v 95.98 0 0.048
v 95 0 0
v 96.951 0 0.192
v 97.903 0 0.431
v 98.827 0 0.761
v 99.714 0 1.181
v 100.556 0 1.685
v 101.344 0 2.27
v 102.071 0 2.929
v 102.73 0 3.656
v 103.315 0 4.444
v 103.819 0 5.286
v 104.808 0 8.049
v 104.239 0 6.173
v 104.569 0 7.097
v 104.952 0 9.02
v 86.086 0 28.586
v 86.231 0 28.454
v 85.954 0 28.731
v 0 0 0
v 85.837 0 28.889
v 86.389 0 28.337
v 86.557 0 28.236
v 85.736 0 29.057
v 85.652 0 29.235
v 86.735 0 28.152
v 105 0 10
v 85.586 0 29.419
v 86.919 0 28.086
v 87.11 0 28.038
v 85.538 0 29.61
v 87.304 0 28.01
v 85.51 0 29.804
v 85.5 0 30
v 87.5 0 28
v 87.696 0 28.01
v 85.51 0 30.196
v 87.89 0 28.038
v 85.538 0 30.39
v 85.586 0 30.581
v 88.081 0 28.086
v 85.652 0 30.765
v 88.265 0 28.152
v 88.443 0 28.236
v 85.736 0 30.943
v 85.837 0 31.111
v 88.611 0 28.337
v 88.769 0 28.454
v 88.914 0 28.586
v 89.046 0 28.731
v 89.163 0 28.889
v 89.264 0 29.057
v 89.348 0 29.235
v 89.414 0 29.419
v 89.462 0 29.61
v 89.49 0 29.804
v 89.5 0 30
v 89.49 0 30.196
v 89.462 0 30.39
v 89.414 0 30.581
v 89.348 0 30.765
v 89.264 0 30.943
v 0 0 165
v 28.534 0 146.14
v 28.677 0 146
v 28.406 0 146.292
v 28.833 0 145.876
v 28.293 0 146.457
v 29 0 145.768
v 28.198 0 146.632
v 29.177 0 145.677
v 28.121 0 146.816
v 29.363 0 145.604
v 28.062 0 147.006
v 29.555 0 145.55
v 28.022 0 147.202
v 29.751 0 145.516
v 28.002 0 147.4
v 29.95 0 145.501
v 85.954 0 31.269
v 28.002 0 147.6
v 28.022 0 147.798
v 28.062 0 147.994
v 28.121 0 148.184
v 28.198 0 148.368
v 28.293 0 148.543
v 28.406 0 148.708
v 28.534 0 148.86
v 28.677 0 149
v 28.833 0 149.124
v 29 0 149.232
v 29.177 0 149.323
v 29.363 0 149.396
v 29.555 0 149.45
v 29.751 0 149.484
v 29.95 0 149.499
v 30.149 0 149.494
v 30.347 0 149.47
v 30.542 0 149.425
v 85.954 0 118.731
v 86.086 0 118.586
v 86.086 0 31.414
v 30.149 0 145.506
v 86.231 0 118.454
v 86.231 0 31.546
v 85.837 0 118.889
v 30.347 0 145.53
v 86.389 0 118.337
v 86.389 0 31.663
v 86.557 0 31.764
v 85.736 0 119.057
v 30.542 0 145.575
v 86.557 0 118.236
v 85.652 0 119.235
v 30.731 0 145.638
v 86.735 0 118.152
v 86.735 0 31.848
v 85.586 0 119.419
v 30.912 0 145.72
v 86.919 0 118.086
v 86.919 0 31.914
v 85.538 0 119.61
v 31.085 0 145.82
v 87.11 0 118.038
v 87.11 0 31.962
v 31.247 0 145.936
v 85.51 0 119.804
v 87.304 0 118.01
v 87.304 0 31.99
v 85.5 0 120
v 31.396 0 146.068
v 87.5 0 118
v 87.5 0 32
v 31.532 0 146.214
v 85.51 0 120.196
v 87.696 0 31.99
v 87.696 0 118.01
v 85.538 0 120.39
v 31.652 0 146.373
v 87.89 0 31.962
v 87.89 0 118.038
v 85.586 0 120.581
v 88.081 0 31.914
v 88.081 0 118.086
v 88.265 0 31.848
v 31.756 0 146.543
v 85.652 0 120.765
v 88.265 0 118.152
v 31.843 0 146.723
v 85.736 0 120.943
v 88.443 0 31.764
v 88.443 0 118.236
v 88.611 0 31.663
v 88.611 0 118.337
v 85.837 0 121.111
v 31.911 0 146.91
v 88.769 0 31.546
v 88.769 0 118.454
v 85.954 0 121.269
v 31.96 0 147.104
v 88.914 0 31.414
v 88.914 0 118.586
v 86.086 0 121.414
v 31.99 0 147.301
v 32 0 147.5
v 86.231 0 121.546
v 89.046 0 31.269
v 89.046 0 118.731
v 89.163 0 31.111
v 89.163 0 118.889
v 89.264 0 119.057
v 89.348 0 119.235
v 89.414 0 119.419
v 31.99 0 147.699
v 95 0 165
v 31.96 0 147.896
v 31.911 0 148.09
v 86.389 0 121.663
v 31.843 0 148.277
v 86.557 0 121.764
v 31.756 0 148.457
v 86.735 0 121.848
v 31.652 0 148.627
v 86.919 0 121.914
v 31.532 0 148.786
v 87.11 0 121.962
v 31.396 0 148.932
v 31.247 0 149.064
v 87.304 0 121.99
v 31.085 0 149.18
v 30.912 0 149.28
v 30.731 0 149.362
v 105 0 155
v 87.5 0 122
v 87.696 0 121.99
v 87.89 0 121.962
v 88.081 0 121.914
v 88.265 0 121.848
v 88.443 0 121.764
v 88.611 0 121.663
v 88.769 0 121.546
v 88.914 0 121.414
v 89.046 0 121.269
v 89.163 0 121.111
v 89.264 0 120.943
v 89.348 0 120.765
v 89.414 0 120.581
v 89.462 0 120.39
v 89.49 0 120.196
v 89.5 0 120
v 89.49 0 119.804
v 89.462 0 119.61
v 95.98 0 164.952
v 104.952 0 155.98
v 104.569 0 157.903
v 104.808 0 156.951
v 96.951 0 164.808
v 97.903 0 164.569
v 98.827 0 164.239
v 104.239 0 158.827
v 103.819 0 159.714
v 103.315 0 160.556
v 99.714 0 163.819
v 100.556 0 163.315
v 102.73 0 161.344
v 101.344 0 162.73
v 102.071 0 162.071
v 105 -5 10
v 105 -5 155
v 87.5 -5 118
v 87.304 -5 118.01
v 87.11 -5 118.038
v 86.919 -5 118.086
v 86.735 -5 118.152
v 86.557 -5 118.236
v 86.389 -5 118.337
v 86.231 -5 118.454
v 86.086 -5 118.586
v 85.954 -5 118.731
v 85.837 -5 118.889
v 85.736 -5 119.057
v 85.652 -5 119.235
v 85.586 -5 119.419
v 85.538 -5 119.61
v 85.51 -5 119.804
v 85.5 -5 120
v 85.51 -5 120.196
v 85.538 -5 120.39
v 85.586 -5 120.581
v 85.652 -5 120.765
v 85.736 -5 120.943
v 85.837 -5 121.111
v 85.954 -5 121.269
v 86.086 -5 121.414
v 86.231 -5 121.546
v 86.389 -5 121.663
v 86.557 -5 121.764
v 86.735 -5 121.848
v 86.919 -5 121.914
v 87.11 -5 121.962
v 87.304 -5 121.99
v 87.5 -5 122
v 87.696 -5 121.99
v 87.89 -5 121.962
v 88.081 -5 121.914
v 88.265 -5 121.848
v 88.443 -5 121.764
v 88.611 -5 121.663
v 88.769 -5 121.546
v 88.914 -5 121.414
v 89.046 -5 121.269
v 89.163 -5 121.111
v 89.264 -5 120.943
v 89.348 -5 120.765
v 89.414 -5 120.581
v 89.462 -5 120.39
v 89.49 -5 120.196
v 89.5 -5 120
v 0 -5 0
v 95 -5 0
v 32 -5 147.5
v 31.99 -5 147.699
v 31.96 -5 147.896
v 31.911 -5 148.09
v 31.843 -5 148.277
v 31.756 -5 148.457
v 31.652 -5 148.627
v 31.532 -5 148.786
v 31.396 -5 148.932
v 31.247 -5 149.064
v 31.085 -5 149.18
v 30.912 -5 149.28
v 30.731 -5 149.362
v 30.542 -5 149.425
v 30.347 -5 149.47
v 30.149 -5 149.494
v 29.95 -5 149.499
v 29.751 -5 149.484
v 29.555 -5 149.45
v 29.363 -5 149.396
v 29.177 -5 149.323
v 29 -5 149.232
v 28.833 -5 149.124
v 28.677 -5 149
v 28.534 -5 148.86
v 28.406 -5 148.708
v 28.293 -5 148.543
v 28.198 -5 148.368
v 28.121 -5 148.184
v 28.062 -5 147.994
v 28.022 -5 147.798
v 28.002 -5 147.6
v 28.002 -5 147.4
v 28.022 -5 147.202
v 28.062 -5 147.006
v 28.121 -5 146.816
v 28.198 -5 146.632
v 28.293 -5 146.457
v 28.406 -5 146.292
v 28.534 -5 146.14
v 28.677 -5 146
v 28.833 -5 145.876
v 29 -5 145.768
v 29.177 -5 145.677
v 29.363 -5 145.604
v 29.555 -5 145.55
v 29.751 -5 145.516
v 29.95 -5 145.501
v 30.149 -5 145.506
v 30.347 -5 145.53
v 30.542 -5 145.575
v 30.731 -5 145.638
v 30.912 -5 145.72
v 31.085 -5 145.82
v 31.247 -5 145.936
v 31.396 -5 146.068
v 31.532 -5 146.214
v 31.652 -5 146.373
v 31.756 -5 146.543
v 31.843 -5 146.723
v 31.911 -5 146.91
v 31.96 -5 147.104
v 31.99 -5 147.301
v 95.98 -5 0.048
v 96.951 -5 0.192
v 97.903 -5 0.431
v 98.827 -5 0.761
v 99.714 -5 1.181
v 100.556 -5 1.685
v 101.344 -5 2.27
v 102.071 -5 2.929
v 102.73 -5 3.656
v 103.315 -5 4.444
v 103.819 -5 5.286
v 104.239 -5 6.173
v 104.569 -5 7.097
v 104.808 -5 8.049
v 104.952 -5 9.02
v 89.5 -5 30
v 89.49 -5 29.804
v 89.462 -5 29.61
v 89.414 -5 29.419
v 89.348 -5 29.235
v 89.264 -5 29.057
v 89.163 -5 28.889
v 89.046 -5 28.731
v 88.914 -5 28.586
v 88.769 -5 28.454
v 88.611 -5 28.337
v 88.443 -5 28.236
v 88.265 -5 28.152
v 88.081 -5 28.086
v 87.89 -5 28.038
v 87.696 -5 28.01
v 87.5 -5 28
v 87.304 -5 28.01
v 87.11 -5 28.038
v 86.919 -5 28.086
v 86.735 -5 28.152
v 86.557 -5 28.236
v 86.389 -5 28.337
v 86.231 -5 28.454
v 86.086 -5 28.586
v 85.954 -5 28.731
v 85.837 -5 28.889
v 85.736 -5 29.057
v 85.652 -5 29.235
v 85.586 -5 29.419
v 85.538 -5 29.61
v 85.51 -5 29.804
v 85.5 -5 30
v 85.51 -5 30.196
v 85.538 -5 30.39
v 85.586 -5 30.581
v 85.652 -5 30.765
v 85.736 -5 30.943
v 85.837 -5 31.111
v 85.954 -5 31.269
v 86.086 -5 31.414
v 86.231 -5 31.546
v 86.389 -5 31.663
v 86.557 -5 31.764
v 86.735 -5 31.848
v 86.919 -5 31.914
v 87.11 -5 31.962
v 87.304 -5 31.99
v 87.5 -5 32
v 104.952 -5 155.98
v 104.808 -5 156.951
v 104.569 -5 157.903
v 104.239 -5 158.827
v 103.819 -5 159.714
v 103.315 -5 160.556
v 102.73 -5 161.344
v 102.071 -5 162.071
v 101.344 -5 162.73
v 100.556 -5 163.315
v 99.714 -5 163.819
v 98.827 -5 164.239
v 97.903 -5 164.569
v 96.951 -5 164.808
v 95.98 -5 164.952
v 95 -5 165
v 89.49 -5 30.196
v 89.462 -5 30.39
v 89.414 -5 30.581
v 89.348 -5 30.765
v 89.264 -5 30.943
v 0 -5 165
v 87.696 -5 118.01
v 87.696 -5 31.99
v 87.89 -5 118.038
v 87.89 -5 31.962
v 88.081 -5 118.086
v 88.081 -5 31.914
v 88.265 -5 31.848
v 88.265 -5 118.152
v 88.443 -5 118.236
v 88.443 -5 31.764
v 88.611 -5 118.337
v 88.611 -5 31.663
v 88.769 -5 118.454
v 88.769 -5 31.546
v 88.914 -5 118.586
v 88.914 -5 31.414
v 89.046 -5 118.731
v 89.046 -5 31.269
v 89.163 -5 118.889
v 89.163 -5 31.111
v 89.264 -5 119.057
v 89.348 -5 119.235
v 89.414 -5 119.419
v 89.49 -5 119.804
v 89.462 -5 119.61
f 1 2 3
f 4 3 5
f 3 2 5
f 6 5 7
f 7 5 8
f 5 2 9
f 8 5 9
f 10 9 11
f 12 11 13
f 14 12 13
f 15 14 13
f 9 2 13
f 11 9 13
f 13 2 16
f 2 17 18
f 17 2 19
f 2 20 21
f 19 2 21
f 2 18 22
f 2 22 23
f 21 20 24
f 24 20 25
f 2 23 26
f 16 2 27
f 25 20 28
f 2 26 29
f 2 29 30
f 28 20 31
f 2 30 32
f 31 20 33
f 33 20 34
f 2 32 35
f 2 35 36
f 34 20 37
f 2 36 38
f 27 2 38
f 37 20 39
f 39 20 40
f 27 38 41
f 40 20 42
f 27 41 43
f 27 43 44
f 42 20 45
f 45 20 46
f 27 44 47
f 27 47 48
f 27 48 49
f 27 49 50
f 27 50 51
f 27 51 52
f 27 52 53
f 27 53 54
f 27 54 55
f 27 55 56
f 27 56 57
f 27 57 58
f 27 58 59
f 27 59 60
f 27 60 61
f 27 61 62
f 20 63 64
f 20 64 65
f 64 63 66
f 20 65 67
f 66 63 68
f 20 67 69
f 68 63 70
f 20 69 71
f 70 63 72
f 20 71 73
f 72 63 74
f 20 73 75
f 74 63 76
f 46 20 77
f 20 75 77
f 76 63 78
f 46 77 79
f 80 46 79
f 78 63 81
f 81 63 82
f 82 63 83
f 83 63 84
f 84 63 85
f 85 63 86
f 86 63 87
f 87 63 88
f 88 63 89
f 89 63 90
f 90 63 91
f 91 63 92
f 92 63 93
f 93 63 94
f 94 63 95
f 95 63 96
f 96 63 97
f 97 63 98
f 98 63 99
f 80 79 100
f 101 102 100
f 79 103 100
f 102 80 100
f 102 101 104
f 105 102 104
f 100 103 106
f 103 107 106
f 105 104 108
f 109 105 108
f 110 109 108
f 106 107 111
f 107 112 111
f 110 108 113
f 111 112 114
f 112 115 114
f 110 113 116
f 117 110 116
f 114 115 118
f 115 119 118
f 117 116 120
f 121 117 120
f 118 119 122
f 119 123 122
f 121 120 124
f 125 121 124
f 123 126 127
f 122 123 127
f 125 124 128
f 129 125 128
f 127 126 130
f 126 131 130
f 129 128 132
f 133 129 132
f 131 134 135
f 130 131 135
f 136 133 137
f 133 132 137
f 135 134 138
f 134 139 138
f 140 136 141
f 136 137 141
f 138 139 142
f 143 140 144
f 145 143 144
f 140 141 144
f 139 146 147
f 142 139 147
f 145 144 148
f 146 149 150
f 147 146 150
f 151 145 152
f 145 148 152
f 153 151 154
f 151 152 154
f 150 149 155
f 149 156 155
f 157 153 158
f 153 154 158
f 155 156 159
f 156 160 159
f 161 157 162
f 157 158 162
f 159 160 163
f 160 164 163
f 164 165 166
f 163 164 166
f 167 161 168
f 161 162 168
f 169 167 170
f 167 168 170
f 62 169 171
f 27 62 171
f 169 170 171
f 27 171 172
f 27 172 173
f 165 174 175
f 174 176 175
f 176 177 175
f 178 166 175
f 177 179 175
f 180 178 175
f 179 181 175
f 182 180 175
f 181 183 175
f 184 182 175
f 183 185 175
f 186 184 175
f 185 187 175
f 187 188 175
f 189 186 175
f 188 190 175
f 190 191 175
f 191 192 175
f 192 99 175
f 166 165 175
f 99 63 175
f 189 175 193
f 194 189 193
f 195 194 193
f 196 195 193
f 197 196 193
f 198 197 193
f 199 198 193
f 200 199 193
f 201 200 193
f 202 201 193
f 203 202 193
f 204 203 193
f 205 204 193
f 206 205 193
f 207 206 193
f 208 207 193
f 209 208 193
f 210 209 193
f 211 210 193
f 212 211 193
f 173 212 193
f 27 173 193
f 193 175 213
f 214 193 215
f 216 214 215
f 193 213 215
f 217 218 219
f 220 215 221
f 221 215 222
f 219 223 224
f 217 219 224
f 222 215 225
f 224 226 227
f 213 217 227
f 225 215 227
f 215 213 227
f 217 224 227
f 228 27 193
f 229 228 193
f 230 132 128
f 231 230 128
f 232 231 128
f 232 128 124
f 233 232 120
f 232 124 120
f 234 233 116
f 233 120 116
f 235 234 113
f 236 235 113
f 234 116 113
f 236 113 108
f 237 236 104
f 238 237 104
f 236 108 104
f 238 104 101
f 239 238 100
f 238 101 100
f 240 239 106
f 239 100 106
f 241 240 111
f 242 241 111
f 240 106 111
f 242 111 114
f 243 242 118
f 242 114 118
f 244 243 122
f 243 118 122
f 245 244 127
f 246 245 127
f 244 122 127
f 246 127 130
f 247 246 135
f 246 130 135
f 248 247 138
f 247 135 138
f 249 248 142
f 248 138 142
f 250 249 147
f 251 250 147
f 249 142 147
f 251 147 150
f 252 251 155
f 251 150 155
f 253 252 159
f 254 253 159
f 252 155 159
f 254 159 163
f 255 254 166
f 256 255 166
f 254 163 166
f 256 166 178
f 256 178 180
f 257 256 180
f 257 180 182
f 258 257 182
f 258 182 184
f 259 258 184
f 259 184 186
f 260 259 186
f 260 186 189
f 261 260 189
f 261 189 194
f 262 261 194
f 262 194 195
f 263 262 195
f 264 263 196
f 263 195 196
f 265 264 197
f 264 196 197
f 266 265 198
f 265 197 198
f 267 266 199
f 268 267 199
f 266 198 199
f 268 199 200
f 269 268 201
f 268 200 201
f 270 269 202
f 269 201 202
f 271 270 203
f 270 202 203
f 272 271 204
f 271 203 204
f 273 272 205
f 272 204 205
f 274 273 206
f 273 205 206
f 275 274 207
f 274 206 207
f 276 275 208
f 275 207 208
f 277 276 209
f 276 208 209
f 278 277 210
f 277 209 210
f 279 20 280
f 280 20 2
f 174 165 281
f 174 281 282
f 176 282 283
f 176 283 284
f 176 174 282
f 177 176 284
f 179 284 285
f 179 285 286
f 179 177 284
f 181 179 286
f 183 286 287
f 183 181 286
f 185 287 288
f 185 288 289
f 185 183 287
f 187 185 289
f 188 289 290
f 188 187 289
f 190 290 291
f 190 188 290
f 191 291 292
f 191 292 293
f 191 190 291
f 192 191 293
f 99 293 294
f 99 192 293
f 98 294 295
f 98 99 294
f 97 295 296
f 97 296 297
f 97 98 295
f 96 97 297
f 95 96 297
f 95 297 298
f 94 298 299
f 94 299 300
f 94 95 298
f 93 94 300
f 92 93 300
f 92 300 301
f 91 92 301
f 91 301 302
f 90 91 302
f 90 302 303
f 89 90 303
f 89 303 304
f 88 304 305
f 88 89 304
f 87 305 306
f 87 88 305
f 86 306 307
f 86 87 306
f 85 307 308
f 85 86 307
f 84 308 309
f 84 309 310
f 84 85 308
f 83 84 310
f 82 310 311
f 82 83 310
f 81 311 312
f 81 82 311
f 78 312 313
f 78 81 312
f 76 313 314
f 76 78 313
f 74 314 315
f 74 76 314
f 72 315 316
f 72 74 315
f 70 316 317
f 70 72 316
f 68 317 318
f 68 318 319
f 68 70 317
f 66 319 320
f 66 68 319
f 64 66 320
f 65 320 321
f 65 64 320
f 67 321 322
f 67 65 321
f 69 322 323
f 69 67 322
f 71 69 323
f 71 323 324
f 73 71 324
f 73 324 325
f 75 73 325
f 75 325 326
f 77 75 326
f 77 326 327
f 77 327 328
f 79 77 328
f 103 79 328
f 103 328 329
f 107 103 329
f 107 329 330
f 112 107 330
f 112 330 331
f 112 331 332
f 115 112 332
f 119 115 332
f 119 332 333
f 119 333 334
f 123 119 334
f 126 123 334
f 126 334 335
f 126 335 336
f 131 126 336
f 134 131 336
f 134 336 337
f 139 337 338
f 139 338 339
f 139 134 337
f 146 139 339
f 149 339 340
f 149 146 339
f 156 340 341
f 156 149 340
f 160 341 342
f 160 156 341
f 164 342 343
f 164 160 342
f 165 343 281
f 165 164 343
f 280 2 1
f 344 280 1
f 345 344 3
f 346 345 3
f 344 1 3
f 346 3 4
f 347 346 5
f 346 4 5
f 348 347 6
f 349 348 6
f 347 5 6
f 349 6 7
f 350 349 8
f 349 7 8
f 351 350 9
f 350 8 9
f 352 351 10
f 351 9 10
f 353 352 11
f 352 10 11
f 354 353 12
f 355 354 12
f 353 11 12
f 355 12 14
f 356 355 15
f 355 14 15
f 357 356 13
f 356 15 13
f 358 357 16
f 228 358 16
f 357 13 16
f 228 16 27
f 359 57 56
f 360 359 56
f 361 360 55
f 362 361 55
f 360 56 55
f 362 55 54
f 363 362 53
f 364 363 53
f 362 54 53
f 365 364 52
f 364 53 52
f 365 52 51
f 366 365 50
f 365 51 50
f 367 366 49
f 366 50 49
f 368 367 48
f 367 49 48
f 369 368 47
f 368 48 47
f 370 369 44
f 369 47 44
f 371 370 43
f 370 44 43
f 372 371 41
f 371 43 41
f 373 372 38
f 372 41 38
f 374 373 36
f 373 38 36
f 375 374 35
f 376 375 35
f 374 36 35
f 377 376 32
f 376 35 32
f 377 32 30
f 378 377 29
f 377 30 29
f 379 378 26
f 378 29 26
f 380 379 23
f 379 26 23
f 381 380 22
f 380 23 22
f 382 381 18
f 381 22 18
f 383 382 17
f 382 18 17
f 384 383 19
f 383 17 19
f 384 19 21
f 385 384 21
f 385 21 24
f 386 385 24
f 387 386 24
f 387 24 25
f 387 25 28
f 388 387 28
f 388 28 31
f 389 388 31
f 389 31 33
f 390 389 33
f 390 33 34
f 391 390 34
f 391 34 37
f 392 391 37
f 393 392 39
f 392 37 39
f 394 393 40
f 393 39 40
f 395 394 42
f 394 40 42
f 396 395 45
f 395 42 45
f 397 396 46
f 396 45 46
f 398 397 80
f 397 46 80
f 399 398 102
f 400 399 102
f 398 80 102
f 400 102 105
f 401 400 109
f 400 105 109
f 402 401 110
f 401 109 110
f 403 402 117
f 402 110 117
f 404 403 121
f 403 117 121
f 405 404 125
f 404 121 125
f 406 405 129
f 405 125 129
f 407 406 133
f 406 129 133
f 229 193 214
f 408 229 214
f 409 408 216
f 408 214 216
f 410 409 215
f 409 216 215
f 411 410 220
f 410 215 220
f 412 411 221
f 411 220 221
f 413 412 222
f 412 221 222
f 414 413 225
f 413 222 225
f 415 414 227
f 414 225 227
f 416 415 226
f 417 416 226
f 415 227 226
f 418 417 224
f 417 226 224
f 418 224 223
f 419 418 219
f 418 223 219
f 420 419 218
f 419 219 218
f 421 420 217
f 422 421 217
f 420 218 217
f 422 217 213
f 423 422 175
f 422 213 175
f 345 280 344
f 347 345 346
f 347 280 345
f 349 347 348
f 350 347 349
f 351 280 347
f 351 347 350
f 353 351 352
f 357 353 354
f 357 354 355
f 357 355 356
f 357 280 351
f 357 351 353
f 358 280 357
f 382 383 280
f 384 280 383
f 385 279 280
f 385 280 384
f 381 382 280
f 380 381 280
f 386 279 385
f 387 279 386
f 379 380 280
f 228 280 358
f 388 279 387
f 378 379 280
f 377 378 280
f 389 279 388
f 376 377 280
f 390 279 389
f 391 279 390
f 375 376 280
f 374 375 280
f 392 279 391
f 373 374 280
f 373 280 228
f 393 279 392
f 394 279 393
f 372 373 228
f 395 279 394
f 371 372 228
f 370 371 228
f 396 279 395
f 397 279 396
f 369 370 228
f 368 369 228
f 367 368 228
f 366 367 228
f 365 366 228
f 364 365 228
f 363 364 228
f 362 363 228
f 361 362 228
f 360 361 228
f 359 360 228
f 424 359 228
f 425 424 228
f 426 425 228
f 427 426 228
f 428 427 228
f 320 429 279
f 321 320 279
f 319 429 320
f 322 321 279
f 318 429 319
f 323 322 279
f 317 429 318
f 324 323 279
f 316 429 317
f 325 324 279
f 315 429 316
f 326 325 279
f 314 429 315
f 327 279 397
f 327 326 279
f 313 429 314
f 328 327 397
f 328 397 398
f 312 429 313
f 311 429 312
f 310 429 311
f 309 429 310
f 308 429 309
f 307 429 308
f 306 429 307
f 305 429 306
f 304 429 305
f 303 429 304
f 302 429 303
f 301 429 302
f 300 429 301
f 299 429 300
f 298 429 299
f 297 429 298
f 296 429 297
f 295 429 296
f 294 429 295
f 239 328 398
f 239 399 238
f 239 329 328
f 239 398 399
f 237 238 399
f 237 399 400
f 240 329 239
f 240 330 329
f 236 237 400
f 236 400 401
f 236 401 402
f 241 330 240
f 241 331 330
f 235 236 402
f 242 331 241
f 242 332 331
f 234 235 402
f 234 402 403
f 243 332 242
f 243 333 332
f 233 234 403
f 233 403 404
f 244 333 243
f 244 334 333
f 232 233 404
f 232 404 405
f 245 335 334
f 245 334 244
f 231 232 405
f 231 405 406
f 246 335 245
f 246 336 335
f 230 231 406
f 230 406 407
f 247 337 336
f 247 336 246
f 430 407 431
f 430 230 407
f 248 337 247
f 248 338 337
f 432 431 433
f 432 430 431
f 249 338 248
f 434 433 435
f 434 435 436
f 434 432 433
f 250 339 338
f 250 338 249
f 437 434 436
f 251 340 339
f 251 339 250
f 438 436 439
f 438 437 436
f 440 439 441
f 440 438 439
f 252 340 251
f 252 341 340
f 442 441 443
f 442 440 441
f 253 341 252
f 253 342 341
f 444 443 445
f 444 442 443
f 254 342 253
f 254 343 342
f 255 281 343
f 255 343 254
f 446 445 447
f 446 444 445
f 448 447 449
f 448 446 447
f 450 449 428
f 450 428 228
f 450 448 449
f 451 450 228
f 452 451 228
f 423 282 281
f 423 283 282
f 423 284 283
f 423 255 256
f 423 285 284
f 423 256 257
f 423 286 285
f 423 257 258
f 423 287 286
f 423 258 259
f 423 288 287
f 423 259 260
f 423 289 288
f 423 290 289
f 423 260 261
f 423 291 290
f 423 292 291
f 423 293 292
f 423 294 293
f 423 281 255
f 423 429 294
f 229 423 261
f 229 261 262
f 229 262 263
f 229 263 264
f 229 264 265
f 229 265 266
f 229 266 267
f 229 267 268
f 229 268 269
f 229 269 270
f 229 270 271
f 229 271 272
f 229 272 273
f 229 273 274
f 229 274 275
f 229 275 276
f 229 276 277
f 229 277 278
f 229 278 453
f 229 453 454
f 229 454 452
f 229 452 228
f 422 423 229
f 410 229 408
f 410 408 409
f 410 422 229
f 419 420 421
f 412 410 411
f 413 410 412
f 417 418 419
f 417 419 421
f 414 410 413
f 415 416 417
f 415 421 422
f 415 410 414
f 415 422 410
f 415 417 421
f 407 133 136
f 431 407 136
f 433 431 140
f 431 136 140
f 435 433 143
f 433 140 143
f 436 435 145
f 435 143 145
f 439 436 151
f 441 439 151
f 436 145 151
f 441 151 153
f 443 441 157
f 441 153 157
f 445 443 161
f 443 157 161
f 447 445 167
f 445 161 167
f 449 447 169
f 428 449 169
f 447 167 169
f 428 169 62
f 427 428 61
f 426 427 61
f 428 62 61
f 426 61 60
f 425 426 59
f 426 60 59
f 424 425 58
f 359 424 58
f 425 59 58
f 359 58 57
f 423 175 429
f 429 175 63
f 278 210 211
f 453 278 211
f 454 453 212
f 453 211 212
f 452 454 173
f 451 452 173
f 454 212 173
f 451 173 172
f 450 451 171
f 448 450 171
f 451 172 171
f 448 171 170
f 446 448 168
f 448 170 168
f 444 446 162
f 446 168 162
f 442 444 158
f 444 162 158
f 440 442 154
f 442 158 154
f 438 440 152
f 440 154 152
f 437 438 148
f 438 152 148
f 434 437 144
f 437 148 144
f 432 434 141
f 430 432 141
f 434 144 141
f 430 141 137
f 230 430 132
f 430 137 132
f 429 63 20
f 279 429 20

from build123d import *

# Parameters (mm, degrees)
F0_R     = 2
F1_DEPTH = 5


with BuildPart() as f1:
    # F0 (on Front) → F1 (new body)
    with BuildSketch(Plane.XZ):
        with BuildLine():
            Line((0, 165), (0, 0))
            Line((0, 0), (95, 0))
            ThreePointArc((95, 0), (102.071068, 2.928932), (105, 10))
            Line((105, 10), (105, 155))
            ThreePointArc((105, 155), (102.071068, 162.071068), (95, 165))
            Line((95, 165), (0, 165))
        make_face()
        with BuildLine():
            ThreePointArc((89.5, 30), (86.085786, 28.585786), (87.5, 32))
            ThreePointArc((87.5, 32), (88.914214, 31.414214), (89.5, 30))
        make_face(mode=Mode.SUBTRACT)
        with Locations((30, 147.5)):
            Circle(F0_R, mode=Mode.SUBTRACT)
        with BuildLine():
            ThreePointArc((87.5, 118), (86.085786, 121.414214), (89.5, 120))
            ThreePointArc((89.5, 120), (88.914214, 118.585786), (87.5, 118))
        make_face(mode=Mode.SUBTRACT)
    extrude(amount=F1_DEPTH)


solid = f1.part
